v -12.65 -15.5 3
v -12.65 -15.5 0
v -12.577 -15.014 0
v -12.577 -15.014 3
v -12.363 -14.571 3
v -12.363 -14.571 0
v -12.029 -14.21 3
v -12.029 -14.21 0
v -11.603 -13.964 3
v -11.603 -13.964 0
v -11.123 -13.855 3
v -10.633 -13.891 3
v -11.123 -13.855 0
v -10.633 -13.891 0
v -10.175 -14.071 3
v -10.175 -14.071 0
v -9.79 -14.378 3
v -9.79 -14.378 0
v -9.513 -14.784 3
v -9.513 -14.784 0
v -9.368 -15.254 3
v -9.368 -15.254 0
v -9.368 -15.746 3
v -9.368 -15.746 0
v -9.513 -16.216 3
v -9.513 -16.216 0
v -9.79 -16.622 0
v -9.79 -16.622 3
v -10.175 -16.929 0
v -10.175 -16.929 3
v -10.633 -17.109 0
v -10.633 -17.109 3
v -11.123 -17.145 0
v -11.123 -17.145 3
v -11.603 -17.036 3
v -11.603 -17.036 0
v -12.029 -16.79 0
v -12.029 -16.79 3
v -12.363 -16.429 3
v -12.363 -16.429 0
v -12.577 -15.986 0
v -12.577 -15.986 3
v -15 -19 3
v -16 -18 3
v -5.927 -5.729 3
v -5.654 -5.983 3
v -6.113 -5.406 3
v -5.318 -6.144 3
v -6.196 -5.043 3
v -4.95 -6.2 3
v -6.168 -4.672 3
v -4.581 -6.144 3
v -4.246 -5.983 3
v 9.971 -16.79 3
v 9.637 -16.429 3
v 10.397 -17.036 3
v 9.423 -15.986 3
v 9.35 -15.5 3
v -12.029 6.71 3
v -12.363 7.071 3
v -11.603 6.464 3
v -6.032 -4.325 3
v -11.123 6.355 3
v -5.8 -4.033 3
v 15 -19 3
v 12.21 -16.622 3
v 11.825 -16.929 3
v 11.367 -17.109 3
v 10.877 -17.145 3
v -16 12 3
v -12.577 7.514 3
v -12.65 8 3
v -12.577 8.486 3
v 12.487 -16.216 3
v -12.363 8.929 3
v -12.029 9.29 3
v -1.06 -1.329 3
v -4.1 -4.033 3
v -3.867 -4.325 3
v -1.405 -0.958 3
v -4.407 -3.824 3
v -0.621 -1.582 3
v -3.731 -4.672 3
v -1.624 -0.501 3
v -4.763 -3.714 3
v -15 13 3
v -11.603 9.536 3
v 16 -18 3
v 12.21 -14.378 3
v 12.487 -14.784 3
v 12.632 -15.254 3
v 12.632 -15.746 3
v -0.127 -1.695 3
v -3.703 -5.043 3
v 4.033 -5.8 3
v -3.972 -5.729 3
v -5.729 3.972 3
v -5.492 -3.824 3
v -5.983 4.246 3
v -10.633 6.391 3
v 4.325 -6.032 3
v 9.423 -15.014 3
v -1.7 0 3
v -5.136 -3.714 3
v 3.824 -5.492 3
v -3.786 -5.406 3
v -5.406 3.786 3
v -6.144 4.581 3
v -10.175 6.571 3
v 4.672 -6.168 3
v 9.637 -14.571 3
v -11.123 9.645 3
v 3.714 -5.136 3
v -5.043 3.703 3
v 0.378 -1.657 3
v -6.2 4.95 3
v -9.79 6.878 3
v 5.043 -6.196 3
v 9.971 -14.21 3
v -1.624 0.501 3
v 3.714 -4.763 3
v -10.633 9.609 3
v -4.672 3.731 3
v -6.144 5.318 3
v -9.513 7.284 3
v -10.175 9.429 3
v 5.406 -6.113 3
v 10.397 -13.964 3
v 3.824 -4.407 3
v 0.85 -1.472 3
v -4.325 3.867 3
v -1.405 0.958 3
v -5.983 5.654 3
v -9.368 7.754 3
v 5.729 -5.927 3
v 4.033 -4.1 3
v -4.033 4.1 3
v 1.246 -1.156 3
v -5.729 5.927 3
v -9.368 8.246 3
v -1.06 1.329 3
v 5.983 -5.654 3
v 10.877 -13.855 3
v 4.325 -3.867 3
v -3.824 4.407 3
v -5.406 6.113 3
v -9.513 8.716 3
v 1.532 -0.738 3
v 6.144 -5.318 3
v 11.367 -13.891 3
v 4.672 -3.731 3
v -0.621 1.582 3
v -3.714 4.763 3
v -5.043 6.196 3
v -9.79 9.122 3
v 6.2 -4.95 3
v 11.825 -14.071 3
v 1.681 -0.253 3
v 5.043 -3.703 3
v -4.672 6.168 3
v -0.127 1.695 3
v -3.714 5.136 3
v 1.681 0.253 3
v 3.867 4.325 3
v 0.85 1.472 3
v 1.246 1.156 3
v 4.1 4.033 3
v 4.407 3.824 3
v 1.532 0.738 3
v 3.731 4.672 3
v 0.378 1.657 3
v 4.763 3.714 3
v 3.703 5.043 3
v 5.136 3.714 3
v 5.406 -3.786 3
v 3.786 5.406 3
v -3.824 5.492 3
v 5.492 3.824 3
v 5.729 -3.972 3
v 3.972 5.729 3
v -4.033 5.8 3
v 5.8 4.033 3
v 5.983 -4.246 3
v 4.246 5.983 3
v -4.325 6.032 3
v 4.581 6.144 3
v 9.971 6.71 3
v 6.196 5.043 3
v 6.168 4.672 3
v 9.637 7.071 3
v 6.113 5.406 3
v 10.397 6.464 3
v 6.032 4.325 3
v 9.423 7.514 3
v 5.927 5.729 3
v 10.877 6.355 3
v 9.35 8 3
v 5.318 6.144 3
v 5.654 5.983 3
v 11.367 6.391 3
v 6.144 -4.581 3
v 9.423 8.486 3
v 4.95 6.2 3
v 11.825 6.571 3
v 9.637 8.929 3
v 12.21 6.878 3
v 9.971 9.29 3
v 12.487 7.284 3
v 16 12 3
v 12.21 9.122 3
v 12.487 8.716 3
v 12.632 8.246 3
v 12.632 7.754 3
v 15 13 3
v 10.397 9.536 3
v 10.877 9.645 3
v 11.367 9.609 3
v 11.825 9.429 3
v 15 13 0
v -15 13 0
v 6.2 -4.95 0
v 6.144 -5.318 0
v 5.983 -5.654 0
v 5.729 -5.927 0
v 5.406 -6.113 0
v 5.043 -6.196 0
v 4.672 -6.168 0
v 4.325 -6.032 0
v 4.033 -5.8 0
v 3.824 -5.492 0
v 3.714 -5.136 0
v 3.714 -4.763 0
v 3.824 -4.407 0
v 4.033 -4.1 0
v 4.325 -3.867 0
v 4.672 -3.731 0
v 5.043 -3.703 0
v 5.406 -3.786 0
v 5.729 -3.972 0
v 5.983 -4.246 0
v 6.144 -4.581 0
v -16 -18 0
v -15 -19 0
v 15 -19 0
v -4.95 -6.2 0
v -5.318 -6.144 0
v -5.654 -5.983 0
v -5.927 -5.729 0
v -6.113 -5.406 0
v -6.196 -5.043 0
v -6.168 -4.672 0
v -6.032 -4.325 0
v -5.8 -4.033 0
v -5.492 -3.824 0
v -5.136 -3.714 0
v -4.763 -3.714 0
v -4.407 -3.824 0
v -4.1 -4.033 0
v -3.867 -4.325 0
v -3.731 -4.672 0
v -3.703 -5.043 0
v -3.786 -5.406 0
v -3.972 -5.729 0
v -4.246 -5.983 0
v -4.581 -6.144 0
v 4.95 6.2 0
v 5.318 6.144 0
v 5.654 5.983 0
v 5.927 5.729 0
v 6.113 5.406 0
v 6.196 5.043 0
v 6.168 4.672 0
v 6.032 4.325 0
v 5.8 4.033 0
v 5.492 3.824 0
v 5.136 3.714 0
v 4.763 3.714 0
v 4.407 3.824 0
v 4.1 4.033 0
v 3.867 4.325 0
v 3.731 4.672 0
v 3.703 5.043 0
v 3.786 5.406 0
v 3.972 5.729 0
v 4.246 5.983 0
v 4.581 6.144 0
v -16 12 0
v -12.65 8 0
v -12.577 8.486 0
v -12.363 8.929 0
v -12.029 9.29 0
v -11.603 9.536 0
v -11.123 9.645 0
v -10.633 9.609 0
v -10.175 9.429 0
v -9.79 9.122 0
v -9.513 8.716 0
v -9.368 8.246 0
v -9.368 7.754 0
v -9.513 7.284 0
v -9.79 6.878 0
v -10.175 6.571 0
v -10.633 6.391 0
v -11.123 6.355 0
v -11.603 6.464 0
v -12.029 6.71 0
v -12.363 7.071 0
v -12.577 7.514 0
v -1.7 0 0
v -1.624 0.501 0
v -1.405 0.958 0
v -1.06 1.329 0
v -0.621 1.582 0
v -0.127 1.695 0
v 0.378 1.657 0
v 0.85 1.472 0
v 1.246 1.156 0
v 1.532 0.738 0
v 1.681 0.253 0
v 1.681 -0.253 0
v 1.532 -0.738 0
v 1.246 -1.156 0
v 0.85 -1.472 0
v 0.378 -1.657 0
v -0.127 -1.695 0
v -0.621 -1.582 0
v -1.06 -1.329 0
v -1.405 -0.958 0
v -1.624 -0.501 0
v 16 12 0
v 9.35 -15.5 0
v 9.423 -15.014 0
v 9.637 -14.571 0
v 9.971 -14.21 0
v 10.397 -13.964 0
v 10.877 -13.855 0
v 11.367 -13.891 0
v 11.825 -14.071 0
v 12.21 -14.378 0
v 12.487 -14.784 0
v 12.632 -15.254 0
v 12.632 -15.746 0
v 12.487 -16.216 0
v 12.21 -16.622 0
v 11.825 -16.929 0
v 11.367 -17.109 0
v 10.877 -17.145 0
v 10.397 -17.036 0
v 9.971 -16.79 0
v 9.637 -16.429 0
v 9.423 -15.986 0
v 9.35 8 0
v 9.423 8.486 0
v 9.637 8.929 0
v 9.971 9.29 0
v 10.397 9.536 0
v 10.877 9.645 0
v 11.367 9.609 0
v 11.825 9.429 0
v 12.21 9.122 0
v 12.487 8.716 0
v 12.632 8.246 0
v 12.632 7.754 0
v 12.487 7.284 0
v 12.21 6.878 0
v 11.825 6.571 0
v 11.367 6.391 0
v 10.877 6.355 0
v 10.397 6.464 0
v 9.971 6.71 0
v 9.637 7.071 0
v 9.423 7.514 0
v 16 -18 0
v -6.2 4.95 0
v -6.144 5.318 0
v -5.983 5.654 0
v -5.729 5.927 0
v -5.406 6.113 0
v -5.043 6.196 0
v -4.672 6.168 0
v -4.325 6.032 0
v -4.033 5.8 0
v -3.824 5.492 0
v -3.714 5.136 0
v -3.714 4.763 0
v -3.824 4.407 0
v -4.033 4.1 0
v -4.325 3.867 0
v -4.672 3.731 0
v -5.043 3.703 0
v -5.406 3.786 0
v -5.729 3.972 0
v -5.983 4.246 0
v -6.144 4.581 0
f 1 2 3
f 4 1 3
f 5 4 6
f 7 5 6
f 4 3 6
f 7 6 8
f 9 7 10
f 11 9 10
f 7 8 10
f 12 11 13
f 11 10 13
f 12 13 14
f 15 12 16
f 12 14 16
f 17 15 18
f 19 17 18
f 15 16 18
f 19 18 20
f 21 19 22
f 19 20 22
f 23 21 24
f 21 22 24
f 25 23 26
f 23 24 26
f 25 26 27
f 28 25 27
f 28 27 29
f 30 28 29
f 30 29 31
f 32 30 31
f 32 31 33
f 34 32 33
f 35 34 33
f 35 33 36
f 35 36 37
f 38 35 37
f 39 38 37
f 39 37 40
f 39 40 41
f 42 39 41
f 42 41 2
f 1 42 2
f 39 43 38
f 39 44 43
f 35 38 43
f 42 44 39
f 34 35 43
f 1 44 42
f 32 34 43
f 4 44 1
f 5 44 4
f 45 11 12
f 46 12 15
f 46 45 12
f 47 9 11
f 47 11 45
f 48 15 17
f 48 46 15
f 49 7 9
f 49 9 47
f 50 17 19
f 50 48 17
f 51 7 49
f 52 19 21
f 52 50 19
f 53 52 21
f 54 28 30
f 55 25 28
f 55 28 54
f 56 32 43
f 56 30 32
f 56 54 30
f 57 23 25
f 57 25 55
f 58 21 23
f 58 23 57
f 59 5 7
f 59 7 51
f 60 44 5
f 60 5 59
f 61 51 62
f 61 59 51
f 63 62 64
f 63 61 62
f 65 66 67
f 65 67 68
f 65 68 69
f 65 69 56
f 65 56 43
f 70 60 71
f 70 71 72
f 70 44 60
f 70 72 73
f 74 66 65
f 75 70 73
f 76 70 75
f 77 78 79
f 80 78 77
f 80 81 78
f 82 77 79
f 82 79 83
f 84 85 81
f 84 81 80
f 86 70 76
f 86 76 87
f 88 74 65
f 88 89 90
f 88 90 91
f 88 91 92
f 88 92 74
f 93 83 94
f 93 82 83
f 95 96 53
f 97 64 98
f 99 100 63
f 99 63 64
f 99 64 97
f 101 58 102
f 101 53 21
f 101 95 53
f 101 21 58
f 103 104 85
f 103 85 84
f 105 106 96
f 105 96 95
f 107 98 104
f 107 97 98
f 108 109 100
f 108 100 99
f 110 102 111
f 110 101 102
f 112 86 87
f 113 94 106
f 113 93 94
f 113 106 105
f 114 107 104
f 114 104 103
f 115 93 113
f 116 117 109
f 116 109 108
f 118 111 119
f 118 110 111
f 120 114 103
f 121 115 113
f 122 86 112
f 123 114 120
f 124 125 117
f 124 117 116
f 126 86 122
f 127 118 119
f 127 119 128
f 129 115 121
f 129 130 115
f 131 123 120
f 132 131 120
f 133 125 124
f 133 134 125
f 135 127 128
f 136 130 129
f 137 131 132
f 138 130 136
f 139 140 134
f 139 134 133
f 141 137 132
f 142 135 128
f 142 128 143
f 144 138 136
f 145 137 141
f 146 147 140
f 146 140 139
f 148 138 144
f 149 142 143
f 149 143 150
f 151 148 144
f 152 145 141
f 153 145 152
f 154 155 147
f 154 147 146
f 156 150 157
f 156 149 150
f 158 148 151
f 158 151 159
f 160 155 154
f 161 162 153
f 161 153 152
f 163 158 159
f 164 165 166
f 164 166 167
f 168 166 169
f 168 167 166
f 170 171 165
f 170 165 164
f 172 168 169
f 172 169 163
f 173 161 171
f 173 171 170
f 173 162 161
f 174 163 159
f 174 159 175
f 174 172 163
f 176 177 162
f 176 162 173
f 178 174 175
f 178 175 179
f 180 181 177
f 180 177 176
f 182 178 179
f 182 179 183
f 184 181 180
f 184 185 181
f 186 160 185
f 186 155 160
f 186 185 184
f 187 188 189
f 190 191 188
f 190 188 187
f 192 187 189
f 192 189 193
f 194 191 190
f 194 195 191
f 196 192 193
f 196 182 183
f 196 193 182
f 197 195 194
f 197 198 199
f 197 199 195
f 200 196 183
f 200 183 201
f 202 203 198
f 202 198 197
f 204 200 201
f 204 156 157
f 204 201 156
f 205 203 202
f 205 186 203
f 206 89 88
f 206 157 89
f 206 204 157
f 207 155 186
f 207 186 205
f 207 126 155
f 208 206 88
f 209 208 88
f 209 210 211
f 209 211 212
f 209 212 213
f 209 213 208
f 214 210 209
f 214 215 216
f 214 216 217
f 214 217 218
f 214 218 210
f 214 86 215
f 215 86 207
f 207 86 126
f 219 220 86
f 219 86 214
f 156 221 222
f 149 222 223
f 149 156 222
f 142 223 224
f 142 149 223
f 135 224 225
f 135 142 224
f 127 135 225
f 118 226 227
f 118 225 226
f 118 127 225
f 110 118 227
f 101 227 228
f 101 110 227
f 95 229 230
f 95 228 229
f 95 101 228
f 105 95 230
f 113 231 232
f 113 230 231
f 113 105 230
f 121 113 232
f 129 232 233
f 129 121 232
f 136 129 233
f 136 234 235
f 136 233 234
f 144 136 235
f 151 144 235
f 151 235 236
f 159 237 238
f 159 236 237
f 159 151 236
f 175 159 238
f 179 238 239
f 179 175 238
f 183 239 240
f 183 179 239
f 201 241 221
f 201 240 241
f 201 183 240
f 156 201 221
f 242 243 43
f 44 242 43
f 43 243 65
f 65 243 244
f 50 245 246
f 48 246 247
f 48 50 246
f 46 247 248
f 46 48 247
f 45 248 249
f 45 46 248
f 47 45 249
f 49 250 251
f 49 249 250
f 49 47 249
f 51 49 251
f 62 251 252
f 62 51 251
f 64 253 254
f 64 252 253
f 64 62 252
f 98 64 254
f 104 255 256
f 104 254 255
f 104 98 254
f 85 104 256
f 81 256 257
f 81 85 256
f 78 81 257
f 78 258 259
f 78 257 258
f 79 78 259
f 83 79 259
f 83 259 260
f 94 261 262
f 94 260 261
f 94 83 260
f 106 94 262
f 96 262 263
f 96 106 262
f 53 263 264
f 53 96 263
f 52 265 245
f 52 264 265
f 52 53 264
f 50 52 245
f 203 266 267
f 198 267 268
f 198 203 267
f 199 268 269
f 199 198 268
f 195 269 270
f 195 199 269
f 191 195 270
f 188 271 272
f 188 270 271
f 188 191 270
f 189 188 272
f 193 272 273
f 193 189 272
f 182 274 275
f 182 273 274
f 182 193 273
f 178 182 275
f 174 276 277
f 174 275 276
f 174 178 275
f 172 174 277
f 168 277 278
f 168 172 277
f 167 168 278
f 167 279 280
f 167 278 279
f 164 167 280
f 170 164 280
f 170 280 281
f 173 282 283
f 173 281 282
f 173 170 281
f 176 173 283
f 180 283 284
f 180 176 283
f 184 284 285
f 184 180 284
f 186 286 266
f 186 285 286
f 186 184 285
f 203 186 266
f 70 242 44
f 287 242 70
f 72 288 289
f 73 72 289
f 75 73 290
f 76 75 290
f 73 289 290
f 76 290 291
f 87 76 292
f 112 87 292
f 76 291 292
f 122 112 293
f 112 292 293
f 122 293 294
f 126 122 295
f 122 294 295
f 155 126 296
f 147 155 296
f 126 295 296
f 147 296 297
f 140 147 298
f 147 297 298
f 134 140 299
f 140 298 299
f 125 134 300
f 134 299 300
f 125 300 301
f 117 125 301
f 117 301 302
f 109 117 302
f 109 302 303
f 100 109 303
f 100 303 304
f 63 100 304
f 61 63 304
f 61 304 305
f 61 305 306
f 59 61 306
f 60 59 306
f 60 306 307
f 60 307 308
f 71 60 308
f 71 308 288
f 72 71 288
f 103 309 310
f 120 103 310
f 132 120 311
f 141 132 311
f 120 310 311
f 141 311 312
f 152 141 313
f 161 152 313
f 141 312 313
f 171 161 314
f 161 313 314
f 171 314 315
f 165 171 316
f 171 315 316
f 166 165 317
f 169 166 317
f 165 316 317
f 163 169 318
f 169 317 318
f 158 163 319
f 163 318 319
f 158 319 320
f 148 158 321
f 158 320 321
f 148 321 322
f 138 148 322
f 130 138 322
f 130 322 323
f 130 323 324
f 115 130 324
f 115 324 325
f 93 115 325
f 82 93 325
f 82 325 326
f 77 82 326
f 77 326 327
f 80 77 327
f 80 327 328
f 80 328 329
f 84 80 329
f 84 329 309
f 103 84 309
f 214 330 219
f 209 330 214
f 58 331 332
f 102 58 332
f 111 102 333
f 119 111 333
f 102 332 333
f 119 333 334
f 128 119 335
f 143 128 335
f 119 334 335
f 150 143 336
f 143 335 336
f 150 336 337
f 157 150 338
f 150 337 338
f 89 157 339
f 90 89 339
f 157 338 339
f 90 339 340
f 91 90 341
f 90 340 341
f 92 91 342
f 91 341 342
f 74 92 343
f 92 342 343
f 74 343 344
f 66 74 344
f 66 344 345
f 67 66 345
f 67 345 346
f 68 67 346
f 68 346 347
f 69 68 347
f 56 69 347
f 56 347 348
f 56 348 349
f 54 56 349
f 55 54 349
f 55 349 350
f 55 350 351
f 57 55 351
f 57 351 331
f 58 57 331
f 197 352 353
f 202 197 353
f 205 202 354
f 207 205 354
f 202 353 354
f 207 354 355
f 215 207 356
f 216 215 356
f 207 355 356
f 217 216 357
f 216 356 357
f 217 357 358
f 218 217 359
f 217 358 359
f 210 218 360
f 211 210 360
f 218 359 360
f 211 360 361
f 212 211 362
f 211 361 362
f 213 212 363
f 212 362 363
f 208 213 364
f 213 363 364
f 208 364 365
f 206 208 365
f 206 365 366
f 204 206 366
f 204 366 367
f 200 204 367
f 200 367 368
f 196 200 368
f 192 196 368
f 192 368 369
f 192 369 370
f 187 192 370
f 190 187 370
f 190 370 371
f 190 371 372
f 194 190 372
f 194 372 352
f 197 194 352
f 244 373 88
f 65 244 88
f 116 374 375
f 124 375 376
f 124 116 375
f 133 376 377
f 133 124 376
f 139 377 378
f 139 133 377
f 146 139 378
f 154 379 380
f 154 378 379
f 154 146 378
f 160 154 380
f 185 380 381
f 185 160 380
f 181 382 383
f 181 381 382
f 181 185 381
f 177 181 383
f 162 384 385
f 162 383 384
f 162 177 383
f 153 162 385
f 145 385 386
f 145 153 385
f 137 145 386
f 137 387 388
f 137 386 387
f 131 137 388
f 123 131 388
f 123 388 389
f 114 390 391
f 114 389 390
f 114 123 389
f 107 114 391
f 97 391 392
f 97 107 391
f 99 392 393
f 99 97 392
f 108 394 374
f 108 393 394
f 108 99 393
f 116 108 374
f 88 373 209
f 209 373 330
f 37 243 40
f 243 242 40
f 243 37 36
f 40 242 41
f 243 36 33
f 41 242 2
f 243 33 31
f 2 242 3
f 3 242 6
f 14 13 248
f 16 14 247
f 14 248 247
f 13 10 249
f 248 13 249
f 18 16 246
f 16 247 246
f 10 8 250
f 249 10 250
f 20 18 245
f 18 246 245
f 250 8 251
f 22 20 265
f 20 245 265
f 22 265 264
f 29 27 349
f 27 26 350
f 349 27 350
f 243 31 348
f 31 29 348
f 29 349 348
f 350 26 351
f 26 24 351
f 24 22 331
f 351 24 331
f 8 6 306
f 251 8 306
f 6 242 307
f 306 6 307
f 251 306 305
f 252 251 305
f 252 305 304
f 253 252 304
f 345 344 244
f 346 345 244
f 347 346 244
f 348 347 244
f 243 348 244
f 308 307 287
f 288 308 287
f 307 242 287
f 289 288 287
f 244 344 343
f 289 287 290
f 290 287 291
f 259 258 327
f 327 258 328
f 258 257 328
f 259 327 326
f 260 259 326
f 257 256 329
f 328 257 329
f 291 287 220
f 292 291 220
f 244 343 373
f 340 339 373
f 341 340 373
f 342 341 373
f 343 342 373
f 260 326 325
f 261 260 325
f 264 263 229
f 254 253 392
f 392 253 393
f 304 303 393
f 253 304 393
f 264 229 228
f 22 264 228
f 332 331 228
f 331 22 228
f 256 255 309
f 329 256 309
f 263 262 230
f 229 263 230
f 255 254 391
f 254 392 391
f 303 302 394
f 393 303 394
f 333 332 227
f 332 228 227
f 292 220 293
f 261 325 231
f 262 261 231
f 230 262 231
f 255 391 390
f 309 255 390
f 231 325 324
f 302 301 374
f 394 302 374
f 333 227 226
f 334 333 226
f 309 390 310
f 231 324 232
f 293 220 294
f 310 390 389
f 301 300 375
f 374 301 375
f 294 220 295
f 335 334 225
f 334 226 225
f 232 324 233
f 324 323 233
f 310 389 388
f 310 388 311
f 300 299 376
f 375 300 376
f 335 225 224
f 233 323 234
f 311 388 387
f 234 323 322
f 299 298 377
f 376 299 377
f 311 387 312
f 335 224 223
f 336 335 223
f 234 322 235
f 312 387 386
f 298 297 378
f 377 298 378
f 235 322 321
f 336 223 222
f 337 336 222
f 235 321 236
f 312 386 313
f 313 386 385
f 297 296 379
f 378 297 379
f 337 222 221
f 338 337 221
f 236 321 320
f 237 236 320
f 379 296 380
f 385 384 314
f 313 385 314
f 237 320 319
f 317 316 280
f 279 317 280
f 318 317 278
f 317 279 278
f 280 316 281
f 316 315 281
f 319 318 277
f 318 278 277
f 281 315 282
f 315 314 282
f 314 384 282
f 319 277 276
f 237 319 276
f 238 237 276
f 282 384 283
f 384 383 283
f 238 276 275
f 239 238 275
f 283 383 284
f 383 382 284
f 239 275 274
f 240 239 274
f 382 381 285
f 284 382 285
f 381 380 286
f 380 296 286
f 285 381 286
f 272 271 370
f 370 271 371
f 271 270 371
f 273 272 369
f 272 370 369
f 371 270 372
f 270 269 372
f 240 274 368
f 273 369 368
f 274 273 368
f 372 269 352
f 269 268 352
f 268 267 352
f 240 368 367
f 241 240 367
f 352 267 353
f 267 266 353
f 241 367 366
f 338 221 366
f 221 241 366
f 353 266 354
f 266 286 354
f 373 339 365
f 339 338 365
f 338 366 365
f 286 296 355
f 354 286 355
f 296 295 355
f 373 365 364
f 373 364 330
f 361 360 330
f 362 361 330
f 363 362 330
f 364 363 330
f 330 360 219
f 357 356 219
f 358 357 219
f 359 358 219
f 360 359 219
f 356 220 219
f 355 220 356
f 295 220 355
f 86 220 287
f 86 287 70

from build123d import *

# Parameters (mm, degrees)
SKETCH_1_W                  = 32
SKETCH_1_H                  = 32
EXTRUDE_1_DEPTH             = 3
HOLE_WIZARD_3_4_3_4_1_D     = 3.4
HOLE_WIZARD_3_4_3_4_1_DEPTH = 6
HOLE_WIZARD_3_4_3_4_1_TIP   = 1.021463052
PATTERN_CIRCULAR_1_COUNT    = 4
HOLE_WIZARD_M4_1_D          = 3.3
CHAMFER_1_SIZE              = 1


with BuildPart() as part:
    # 草图1 → 凸台-拉伸1 (new body)
    with BuildSketch(Plane.XY):
        with Locations((0, -3)):
            Rectangle(SKETCH_1_W, SKETCH_1_H)
    extrude(amount=EXTRUDE_1_DEPTH)

    # Ø3.4 (3.4) 直径孔1
    with Locations(Plane.XY.offset(3)):
        with Locations((0, 0)):
            Hole(HOLE_WIZARD_3_4_3_4_1_D / 2, depth=HOLE_WIZARD_3_4_3_4_1_DEPTH)
            with Locations((0, 0, -(HOLE_WIZARD_3_4_3_4_1_DEPTH + HOLE_WIZARD_3_4_3_4_1_TIP / 2))):  # 118° drill point
                Cone(0, HOLE_WIZARD_3_4_3_4_1_D / 2, HOLE_WIZARD_3_4_3_4_1_TIP, mode=Mode.SUBTRACT)

    # 草图4 → M3 螺纹孔1 (revolve, cut)
    with BuildSketch(Plane(origin=(-4.949747468, -4.949747468, 3), x_dir=(0, -1, 0), z_dir=(1, 0, 0))):
        Polygon((0, 0), (0, 9.251075774), (1.25, 8.5), (1.25, 0), align=None)
    hole_wizard_m3_1 = revolve(axis=Axis((-4.949747468, -4.949747468, 9.35), (0, 0, -1)), mode=Mode.SUBTRACT)

    # 阵列(圆周)1: M3 螺纹孔1 ×4 about axis
    pattern_circular_1_axis = Axis((0, 0, 0), (0, 0, 1))
    for i in range(1, PATTERN_CIRCULAR_1_COUNT):
        add(hole_wizard_m3_1.rotate(pattern_circular_1_axis, i * 360 / PATTERN_CIRCULAR_1_COUNT), mode=Mode.SUBTRACT)

    # M4 螺纹孔1 (through all)
    with Locations(Plane.XY.offset(3)):
        with Locations((-11, 8), (11, 8), (-11, -15.5), (11, -15.5)):
            Hole(HOLE_WIZARD_M4_1_D / 2)

    # 倒角1
    chamfer_1_edges = [part.edges().sort_by_distance(p)[0] for p in [
        (-16, 13, 1.5),
        (16, 13, 1.5),
        (16, -19, 1.5),
        (-16, -19, 1.5),
    ]]
    chamfer(chamfer_1_edges, length=CHAMFER_1_SIZE)


solid = part.part
